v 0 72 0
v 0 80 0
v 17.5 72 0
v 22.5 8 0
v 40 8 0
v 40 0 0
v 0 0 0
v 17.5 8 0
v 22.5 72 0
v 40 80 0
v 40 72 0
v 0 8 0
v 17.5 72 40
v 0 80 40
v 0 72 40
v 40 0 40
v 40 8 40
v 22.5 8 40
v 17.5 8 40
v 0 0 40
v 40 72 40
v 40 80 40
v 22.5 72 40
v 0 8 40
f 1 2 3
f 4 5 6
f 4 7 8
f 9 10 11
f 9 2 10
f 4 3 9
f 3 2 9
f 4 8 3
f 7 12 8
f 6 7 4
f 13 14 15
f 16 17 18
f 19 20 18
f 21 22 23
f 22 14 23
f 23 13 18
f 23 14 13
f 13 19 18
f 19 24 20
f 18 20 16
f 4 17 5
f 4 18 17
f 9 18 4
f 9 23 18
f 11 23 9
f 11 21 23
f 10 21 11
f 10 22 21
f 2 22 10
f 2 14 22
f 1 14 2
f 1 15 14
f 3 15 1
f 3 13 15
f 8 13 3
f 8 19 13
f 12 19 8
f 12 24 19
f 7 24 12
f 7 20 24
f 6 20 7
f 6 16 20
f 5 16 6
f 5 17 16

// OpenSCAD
$fn = 32;

// ----------------------------------------------------------------------
// Structural section: ibeam 40 x 80 mm
// ----------------------------------------------------------------------

// --- parameters (mm) ---
sec_w = 40;               // section width, X
sec_h = 80;               // section height, Y
flange_t = 8;             // flange thickness
web_t = 5;                // web thickness
plate_t = 40;             // cut length, Z (extrusion height)

profile = [[0, 0], [40, 0], [40, 8], [22.5, 8], [22.5, 72], [40, 72], [40, 80], [0, 80], [0, 72], [17.5, 72], [17.5, 8], [0, 8]];  // primary outline, 12 points, counter clockwise

// --- the one profile operation ---
linear_extrude(height = plate_t) polygon(points = profile);
